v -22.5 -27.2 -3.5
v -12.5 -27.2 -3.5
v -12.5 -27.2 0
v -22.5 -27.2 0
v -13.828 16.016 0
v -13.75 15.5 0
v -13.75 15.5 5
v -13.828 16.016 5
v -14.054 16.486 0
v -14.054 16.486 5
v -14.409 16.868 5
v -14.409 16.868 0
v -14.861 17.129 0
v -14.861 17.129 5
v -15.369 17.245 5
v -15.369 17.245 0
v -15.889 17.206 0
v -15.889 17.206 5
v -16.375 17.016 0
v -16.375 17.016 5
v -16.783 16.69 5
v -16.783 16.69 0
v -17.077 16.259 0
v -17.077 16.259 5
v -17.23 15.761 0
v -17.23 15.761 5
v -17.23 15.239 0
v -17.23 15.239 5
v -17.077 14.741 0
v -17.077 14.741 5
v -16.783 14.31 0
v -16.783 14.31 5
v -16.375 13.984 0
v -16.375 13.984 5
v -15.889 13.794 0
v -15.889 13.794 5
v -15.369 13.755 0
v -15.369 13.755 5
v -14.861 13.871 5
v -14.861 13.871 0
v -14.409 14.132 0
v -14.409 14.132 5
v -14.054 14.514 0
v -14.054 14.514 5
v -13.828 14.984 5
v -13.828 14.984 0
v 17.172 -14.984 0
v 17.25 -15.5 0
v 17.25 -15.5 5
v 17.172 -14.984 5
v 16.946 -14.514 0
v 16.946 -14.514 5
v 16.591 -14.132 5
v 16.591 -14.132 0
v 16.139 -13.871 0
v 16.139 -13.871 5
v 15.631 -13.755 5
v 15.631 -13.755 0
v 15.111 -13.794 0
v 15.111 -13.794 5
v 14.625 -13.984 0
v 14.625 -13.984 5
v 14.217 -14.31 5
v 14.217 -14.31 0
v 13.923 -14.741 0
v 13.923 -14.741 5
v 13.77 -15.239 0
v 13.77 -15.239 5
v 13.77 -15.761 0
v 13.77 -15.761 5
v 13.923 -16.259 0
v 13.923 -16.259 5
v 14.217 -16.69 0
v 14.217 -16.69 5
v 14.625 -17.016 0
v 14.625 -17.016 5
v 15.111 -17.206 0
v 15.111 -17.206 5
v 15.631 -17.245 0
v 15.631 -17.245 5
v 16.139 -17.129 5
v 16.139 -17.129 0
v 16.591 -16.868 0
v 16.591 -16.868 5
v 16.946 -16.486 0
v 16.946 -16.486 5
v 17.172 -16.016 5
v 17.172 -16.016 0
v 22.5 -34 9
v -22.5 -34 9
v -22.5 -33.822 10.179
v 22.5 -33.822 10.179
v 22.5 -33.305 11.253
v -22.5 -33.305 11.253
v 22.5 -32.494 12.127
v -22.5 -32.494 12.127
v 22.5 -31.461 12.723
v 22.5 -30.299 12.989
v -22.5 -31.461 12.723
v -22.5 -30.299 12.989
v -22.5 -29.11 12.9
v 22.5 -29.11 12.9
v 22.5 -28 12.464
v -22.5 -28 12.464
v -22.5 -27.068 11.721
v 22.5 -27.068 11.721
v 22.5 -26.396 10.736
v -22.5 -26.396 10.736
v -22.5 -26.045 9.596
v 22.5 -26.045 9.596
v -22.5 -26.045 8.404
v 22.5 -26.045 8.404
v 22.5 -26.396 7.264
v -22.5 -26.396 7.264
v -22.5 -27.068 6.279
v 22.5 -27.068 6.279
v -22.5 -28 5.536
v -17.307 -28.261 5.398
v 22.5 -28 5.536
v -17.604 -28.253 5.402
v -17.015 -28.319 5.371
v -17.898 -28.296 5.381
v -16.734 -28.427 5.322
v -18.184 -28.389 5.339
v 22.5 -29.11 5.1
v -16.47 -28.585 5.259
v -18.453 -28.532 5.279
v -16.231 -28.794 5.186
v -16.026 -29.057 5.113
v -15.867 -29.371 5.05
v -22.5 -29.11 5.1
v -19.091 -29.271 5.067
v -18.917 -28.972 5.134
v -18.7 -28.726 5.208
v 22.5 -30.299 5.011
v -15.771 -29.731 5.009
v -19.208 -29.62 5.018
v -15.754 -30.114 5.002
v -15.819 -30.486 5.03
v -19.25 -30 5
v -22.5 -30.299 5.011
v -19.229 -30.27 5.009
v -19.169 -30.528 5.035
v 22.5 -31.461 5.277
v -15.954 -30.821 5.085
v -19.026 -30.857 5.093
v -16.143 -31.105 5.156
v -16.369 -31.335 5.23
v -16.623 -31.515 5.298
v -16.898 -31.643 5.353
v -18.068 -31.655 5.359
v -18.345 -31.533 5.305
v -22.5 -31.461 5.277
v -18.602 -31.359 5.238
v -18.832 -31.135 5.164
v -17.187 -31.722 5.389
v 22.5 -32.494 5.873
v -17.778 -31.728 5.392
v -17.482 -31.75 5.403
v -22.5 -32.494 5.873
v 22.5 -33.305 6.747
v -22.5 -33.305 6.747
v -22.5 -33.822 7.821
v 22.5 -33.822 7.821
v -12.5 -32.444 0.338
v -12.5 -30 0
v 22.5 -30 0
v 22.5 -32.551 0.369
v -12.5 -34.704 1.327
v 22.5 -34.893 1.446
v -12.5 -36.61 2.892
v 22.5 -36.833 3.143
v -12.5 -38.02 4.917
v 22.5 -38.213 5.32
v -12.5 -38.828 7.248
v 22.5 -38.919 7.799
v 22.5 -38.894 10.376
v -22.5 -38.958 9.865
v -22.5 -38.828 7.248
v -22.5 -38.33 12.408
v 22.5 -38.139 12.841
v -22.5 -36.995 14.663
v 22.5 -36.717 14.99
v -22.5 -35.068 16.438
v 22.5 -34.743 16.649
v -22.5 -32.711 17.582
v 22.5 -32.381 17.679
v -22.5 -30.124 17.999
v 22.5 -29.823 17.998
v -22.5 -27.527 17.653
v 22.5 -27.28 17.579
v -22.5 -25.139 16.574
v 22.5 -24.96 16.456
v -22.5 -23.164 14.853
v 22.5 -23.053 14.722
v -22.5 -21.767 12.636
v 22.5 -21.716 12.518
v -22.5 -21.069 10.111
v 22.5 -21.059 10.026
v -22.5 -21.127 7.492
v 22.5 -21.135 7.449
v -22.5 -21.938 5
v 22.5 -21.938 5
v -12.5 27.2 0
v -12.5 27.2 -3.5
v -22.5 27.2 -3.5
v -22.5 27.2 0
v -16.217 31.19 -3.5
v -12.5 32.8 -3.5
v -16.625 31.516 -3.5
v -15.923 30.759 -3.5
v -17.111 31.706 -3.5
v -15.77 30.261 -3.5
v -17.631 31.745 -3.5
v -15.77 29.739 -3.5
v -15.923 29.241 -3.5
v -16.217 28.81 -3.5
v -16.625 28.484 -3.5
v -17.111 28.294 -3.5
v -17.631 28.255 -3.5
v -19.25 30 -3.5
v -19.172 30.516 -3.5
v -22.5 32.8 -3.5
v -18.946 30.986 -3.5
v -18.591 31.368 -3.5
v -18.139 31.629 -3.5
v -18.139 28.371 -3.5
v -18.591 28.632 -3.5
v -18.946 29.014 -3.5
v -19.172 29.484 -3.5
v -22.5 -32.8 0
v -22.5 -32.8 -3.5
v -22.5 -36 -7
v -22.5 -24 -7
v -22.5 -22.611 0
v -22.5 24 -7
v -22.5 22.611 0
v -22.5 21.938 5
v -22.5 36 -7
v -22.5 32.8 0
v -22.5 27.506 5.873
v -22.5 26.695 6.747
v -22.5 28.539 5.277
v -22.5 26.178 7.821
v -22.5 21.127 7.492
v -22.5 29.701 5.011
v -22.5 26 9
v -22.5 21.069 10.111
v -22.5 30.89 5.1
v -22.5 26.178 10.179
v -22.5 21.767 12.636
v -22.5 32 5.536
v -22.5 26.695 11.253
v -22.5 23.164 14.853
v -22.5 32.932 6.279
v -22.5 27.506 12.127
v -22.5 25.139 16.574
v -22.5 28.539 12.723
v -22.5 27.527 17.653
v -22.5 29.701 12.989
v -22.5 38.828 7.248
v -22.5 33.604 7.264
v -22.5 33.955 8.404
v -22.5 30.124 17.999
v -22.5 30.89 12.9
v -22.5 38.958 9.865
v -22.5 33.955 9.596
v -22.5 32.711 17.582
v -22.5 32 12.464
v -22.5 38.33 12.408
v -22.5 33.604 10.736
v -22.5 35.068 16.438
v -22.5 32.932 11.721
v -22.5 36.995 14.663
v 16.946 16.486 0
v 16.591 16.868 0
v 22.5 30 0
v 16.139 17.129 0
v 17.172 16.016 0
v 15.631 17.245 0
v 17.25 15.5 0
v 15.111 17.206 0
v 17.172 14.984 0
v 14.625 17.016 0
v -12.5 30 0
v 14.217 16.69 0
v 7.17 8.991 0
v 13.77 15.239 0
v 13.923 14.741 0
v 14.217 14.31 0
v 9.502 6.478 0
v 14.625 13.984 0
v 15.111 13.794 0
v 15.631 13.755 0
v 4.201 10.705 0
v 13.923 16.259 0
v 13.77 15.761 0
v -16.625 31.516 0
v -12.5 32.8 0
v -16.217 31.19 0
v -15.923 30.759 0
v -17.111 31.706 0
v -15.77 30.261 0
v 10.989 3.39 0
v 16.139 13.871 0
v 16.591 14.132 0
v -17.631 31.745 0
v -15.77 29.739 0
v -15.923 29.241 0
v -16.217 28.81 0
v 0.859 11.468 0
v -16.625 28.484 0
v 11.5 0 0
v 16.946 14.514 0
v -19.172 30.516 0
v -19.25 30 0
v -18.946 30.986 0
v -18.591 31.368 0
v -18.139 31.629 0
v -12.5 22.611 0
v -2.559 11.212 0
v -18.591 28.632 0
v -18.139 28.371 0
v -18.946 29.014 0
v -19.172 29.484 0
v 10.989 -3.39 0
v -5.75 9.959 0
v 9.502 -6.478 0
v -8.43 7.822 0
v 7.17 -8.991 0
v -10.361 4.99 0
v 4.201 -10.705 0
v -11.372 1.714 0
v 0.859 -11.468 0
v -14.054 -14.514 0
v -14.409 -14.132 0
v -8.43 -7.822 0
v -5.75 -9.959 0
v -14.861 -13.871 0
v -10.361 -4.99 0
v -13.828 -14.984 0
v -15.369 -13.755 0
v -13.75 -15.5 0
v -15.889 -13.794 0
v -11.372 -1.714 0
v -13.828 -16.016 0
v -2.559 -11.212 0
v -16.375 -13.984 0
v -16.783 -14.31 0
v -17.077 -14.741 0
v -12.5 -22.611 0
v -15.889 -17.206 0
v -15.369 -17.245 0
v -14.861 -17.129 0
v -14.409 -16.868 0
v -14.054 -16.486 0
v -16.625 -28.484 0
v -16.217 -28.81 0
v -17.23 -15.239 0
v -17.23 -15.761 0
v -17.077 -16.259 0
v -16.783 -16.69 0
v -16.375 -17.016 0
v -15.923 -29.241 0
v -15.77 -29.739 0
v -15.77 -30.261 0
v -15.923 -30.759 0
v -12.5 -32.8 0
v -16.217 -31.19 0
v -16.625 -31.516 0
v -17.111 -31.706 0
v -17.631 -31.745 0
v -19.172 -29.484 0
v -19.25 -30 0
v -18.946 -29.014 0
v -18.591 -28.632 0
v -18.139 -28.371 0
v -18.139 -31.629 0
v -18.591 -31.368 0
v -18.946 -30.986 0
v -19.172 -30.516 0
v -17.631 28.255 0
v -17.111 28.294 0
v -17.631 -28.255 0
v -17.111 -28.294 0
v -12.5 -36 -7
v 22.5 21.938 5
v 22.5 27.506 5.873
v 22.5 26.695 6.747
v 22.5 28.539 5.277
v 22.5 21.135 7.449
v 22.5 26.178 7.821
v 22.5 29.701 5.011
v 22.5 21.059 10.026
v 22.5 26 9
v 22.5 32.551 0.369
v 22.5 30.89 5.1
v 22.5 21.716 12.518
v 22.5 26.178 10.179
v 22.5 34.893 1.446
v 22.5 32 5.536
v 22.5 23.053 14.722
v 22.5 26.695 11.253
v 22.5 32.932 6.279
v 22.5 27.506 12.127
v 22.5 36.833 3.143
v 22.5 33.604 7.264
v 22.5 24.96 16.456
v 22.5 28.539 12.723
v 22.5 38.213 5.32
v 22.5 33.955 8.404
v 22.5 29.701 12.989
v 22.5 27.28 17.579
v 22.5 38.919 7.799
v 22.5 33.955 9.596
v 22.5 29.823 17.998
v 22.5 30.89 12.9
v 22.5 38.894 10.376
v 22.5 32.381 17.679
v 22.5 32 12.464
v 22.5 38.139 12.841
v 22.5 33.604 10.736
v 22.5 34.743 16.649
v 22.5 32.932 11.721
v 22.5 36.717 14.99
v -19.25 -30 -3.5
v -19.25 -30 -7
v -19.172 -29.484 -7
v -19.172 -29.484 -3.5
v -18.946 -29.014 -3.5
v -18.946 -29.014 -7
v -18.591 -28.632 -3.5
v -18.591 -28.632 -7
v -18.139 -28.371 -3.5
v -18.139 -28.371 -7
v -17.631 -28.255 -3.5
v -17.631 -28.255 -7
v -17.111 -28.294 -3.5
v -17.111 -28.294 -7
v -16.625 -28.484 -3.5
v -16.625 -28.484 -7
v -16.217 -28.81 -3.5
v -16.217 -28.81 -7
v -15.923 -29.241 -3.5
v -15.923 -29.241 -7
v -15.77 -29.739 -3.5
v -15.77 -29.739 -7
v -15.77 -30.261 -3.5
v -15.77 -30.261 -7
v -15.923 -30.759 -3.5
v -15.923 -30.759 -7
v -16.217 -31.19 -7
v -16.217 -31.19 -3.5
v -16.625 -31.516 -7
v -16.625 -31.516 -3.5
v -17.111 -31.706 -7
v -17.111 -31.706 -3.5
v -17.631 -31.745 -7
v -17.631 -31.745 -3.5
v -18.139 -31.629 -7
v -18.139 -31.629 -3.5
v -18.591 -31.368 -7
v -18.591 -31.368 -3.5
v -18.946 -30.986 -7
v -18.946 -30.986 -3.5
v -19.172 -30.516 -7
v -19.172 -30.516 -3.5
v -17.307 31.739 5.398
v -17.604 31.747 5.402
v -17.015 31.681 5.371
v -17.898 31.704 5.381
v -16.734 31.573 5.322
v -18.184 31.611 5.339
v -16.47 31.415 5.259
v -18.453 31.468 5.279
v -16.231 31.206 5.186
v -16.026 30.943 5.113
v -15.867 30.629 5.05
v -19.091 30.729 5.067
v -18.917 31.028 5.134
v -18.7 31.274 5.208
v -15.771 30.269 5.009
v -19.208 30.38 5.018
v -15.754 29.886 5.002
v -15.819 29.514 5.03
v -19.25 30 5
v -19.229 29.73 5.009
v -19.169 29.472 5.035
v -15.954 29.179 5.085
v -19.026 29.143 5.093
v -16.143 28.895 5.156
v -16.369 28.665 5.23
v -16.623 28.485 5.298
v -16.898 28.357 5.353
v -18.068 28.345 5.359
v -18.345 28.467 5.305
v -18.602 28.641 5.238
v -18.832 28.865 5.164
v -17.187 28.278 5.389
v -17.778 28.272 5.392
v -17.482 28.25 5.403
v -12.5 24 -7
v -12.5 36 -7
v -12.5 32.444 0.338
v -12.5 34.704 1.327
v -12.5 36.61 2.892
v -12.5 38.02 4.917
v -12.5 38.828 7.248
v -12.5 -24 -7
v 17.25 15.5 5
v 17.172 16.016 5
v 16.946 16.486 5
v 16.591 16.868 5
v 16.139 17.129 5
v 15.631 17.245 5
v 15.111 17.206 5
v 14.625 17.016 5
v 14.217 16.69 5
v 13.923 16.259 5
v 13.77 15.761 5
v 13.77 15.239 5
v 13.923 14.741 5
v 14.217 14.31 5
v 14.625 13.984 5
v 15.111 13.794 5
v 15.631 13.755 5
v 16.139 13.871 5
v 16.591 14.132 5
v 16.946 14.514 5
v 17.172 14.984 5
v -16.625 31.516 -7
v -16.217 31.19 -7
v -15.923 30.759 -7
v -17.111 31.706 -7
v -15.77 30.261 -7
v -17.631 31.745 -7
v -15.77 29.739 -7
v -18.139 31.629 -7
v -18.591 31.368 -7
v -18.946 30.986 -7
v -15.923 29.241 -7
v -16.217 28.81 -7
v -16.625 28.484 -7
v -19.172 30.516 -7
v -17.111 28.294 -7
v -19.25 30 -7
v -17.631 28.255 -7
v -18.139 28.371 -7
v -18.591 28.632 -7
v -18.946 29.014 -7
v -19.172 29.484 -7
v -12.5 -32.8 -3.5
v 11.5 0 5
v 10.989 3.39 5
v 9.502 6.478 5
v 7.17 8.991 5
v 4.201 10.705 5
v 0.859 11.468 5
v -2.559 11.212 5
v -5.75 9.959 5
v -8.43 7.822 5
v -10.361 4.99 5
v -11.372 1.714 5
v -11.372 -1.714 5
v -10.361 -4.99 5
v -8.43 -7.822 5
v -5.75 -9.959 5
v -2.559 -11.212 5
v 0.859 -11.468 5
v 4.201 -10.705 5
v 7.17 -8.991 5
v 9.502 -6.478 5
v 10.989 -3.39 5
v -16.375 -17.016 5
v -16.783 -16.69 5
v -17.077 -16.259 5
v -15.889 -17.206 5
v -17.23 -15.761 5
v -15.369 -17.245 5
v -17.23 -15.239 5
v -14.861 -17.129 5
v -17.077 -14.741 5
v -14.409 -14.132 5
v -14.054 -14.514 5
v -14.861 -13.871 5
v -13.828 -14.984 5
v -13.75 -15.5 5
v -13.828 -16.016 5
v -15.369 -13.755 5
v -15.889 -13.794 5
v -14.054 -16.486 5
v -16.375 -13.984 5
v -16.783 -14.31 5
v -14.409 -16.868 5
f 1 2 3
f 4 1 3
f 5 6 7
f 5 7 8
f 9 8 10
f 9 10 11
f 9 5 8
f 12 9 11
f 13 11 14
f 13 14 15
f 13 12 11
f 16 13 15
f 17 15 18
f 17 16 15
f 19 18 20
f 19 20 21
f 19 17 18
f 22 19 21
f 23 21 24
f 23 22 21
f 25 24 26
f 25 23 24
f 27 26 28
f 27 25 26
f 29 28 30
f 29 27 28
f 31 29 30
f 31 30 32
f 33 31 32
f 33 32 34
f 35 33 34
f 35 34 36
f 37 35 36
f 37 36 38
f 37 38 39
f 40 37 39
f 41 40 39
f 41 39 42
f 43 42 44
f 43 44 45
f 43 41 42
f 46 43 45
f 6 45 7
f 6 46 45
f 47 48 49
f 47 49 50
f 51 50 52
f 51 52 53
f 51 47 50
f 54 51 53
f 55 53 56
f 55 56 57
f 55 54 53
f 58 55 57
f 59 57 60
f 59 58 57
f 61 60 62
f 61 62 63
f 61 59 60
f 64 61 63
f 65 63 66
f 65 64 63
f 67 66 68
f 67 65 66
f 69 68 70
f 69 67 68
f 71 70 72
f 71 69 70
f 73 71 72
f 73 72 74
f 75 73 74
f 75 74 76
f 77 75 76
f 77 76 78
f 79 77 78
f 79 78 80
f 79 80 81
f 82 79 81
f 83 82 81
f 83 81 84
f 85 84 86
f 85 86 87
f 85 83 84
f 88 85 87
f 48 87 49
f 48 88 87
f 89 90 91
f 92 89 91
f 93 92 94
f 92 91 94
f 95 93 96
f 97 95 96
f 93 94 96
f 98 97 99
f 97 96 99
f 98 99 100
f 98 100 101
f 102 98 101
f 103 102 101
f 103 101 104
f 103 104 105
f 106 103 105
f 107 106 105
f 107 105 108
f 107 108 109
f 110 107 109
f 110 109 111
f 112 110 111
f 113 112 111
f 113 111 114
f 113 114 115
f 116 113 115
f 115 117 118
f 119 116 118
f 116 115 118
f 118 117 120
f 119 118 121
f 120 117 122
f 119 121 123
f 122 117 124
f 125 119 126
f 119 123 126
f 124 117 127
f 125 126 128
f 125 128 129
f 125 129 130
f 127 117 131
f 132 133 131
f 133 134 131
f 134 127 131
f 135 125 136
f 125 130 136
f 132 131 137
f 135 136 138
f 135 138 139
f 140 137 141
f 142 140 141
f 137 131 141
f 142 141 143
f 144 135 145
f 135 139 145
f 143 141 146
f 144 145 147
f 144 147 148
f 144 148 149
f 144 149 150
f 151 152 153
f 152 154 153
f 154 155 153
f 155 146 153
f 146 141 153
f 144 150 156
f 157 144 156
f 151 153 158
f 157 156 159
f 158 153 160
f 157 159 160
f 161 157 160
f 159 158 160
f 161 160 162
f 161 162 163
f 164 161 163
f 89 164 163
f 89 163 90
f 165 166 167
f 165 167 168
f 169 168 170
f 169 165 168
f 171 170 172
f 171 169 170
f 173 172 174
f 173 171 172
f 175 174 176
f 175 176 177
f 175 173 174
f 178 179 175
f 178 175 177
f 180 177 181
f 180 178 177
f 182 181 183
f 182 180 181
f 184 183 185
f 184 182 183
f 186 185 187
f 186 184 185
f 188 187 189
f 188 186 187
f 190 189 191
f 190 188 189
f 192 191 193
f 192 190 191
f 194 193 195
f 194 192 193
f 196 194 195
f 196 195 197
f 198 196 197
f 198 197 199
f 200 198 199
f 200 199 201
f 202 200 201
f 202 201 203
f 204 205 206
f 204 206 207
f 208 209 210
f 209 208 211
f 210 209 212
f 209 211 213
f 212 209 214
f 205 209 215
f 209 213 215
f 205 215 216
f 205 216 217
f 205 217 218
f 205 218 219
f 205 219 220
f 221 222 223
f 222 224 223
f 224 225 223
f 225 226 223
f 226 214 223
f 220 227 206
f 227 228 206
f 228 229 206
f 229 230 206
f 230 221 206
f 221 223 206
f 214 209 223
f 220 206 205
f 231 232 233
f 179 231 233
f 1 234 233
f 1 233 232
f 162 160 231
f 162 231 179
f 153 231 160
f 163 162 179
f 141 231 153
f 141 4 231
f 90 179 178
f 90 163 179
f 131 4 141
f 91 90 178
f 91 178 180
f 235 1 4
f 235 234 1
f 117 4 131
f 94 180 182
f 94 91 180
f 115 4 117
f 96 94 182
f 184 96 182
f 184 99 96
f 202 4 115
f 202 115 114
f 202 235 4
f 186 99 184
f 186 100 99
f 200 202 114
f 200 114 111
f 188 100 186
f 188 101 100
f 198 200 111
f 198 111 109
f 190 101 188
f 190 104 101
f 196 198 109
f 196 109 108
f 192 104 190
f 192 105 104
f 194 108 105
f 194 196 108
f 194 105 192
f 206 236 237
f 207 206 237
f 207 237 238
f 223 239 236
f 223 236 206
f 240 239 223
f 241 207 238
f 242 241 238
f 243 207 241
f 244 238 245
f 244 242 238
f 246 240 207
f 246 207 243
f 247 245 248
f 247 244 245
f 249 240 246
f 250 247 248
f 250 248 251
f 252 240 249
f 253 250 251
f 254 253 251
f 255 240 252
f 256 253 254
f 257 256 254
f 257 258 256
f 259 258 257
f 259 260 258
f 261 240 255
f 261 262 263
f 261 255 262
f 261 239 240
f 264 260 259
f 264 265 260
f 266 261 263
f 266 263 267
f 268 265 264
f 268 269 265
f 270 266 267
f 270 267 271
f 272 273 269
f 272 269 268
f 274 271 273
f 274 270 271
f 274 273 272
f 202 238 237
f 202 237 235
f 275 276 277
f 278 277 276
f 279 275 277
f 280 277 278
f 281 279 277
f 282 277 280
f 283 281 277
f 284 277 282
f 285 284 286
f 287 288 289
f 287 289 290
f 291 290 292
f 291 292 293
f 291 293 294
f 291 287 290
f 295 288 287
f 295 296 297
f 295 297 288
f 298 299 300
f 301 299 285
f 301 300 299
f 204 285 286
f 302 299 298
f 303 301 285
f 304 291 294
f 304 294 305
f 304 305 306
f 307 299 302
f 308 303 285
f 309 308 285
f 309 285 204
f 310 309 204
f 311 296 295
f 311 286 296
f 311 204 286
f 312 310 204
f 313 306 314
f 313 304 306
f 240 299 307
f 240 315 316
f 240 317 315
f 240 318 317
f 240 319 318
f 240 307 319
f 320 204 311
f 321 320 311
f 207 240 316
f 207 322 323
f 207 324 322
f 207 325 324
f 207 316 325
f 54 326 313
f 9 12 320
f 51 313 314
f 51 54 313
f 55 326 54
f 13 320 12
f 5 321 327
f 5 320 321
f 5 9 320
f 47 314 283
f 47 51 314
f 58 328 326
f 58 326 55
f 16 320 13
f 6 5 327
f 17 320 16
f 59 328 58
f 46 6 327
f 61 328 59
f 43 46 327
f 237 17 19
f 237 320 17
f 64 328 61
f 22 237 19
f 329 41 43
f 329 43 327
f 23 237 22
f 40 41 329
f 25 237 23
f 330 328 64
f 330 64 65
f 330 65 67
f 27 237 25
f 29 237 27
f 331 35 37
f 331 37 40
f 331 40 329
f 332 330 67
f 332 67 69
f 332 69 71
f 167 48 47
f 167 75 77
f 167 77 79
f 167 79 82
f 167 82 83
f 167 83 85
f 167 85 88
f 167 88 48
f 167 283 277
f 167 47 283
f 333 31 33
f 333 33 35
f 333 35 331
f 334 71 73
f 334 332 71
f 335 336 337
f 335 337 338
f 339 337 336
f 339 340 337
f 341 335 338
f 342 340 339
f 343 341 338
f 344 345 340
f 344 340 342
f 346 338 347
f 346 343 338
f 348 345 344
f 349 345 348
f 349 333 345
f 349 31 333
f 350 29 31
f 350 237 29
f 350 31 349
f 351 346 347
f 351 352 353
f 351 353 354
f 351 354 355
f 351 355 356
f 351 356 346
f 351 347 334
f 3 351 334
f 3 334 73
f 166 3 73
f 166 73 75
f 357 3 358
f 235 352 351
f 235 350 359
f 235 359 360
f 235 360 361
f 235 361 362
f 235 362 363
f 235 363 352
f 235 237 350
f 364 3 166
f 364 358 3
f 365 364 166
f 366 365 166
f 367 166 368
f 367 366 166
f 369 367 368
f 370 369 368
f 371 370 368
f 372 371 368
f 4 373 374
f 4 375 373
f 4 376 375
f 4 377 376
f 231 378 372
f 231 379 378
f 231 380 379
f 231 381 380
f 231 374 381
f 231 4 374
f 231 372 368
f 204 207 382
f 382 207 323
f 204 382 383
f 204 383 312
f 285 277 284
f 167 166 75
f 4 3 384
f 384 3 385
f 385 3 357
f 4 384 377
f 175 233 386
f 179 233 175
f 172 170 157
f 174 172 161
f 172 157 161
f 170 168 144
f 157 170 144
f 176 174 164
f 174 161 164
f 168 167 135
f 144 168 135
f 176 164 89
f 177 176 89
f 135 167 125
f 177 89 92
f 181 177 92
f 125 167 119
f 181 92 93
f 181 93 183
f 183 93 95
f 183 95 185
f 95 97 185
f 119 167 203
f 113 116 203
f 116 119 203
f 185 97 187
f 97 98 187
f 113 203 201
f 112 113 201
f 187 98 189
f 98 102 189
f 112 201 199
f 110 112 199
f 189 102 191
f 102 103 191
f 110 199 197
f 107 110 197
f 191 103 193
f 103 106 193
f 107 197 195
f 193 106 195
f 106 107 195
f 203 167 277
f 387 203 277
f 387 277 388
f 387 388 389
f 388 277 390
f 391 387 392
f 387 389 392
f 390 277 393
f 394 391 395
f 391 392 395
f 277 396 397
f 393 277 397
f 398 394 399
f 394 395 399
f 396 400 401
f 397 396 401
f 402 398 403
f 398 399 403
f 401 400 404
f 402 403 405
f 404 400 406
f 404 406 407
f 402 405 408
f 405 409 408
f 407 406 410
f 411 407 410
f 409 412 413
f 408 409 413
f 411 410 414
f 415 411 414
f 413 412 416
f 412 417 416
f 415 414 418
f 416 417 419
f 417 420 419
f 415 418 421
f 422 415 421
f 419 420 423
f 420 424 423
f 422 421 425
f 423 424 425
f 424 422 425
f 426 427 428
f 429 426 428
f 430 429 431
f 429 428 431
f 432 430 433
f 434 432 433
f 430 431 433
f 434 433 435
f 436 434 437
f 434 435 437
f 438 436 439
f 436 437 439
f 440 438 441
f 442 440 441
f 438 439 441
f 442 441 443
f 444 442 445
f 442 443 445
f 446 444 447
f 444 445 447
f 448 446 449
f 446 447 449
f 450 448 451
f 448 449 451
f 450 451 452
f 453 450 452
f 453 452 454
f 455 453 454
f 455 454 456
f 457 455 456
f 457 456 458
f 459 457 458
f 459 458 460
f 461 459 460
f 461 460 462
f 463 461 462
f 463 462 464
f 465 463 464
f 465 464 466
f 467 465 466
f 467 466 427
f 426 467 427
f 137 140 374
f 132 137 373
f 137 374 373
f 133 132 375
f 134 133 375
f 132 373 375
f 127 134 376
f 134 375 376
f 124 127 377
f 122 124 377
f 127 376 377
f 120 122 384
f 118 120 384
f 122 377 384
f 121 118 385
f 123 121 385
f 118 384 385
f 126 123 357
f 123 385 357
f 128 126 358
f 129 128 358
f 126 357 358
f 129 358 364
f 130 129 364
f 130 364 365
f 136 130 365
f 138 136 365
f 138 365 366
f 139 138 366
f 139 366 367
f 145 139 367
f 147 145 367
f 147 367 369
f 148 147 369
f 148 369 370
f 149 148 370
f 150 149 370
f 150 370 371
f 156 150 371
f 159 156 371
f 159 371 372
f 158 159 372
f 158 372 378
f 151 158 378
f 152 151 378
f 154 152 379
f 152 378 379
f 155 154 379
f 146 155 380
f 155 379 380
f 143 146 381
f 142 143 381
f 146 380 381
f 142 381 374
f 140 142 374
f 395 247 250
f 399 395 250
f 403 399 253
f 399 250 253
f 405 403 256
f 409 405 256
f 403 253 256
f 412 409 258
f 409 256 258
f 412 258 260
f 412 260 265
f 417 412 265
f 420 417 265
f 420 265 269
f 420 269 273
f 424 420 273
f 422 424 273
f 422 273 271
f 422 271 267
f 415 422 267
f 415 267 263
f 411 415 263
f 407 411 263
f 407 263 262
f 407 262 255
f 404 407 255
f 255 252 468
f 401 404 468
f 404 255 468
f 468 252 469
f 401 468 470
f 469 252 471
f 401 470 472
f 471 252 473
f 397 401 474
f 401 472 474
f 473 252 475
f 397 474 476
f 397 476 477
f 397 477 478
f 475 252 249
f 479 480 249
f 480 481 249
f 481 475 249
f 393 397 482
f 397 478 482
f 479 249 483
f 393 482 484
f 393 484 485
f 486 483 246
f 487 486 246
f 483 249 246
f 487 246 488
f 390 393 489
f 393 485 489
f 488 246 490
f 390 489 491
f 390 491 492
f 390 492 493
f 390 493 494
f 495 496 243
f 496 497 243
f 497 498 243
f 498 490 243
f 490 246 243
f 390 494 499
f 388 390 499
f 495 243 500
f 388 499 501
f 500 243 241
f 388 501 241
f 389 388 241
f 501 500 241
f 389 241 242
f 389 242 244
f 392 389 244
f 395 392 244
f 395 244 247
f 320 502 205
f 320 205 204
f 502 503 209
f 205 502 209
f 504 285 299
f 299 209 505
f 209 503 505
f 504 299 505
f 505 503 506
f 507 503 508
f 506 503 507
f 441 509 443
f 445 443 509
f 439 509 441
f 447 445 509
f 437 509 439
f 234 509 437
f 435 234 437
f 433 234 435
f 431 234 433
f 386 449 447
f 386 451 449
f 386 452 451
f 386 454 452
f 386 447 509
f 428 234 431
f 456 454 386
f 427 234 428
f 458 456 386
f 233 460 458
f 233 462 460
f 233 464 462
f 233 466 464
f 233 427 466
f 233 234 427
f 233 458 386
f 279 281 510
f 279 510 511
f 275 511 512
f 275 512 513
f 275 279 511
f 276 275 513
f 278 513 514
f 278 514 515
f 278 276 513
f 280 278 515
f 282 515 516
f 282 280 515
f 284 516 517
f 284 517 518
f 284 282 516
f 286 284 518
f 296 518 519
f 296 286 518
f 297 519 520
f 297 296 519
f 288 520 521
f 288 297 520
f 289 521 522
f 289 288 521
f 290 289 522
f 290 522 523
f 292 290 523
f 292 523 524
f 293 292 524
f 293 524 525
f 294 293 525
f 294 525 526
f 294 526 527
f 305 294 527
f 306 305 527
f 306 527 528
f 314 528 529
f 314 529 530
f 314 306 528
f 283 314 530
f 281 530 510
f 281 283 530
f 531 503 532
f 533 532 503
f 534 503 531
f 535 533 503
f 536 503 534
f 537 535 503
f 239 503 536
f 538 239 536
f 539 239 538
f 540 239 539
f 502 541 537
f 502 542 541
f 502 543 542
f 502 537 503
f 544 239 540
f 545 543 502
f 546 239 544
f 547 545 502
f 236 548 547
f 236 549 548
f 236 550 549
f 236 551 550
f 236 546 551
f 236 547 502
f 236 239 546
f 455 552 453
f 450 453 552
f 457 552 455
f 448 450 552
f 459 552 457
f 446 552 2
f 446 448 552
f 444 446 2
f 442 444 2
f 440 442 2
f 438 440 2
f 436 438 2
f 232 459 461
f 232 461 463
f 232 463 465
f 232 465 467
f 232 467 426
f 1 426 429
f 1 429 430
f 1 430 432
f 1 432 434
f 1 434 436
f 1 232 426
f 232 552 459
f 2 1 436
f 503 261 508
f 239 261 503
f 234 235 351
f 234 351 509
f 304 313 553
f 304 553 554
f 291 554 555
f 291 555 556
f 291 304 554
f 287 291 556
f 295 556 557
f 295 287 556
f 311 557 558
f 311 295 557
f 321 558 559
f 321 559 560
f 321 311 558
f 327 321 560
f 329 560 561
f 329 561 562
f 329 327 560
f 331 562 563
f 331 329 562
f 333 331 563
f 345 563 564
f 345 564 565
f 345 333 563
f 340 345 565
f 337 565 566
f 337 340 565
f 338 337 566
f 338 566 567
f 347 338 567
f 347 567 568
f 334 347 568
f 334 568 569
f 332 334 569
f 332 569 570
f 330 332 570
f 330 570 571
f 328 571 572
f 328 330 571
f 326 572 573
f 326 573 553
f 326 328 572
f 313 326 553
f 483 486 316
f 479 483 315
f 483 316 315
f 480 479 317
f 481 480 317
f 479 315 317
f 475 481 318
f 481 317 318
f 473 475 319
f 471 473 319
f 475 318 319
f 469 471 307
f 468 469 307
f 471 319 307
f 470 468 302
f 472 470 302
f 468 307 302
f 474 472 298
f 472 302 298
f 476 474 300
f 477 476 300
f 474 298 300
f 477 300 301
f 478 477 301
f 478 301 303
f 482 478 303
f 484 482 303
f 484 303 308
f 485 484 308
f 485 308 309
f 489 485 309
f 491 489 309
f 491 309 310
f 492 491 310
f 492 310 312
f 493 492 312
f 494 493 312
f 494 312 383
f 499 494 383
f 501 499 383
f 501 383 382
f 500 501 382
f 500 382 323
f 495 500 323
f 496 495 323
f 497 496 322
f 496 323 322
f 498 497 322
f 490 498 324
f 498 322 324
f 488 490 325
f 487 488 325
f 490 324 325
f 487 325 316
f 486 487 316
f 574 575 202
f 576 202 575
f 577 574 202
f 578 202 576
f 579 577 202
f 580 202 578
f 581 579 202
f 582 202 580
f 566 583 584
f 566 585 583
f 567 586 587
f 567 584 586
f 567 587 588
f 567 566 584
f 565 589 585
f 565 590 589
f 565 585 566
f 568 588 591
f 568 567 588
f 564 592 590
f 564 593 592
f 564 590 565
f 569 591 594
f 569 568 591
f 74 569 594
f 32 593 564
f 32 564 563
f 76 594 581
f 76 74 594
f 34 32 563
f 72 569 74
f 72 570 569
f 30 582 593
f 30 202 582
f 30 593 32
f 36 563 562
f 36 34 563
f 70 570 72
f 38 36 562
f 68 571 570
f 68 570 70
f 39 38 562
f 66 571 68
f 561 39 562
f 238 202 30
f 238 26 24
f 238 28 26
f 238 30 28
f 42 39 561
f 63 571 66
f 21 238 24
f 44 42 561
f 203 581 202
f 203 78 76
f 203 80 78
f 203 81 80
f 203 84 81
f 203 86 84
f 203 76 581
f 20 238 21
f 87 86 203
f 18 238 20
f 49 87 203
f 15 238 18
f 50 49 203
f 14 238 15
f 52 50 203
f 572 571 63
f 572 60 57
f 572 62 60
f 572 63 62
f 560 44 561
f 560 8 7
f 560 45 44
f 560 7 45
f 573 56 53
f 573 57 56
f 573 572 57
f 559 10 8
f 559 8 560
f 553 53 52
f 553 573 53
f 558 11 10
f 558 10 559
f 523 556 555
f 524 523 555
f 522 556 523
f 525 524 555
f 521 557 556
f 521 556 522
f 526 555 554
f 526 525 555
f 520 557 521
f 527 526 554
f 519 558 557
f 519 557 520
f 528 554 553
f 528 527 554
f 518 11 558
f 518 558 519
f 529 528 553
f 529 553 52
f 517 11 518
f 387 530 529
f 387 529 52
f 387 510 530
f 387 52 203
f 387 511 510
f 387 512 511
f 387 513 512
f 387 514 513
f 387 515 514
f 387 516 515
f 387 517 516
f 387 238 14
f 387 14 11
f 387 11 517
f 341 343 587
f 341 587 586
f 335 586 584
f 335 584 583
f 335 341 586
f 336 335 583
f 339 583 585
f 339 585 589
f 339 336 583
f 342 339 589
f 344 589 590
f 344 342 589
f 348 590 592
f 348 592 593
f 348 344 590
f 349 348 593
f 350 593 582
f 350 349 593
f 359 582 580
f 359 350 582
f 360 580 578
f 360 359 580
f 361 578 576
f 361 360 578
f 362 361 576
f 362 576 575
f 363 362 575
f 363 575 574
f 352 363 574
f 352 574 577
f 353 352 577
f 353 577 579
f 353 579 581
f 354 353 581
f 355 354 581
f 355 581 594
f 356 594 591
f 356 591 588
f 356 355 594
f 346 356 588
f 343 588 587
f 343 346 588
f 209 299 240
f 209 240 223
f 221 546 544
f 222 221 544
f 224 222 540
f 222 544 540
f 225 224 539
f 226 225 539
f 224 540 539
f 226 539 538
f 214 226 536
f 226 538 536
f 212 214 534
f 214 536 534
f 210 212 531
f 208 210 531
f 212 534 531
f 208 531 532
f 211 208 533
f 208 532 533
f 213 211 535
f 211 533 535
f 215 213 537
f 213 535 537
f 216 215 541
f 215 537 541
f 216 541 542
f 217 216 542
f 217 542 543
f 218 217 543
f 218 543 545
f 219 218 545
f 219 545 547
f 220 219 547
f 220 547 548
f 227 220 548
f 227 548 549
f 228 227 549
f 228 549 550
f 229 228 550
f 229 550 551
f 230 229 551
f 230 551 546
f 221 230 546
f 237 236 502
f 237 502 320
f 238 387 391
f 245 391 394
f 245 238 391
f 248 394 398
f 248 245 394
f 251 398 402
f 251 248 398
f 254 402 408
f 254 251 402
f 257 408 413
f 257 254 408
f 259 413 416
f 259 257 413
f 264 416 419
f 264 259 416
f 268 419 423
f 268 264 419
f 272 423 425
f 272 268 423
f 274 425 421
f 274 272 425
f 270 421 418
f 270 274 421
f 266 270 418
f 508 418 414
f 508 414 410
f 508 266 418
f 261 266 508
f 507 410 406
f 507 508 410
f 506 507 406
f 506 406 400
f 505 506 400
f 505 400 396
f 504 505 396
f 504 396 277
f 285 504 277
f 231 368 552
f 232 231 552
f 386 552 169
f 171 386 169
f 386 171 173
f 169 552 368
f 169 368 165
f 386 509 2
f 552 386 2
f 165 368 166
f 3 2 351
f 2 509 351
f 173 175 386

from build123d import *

# Parameters (mm, degrees)
ESBO_O1_W                = 45
ESBO_O1_H                = 45
ESBO_O1_R                = 1.75
ESBO_O1_R_2              = 11.5
RESSALTO_EXTRUS_O1_DEPTH = 5
ESBO_O3_R                = 4
RESSALTO_EXTRUS_O2_DEPTH = 45
RESSALTO_EXTRUS_O3_DEPTH = 10
ESBO_O5_R                = 1.75
CORTE_EXTRUS_O2_DEPTH    = 15


with BuildPart() as part:
    # Esboço1 → Ressalto-extrusão1 (new body)
    with BuildSketch(Plane.XY):
        Rectangle(ESBO_O1_W, ESBO_O1_H)
        with Locations((-15.5, 15.5)):
            Circle(ESBO_O1_R, mode=Mode.SUBTRACT)
        with Locations((15.5, 15.5)):
            Circle(ESBO_O1_R, mode=Mode.SUBTRACT)
        with Locations((15.5, -15.5)):
            Circle(ESBO_O1_R, mode=Mode.SUBTRACT)
        with Locations((-15.5, -15.5)):
            Circle(ESBO_O1_R, mode=Mode.SUBTRACT)
        Circle(ESBO_O1_R_2, mode=Mode.SUBTRACT)
    extrude(amount=RESSALTO_EXTRUS_O1_DEPTH)

    # Esboço3 → Ressalto-extrusão2 (add)
    # profile 1 of 2: a face of its own
    with BuildSketch(Plane.ZY.offset(22.5)):
        with BuildLine():
            Line((0, 30), (0, 21.937742252))
            Line((0, 21.937742252), (5, 21.937742252))
            ThreePointArc((5, 21.937742252), (16.64852927, 34.74341649), (0, 30))
        make_face()
        with Locations(Location((9, 30, 0), (0, 0, 270))):
            Circle(ESBO_O3_R, mode=Mode.SUBTRACT)
    # profile 2 of 2: a face of its own
    with BuildSketch(Plane.ZY.offset(22.5)):
        with BuildLine():
            Line((5, -21.937742252), (0, -21.937742252))
            Line((0, -21.937742252), (0, -30))
            ThreePointArc((0, -30), (16.64852927, -34.74341649), (5, -21.937742252))
        make_face()
        with Locations(Location((9, -30, 0), (0, 0, 270))):
            Circle(ESBO_O3_R, mode=Mode.SUBTRACT)
    extrude(amount=-RESSALTO_EXTRUS_O2_DEPTH)

    # Esboço4 → Ressalto-extrusão3 (add)
    # profile 1 of 2: a face of its own
    with BuildSketch(Plane.ZY.offset(22.5)):
        Polygon((7.247929139, 38.827811037), (-7, 36), (-7, 24), (0, 22.610697943), align=None)
        Polygon((0, 30), (0, 32.8), (-3.5, 32.8), (-3.5, 27.2), (0, 27.2), align=None, mode=Mode.SUBTRACT)
    # profile 2 of 2: a face of its own
    with BuildSketch(Plane.ZY.offset(22.5)):
        Polygon((7.247929139, -38.827811037), (0, -22.610697943), (-7, -24), (-7, -36), align=None)
        Polygon((0, -27.2), (0, -30), (0, -32.8), (-3.5, -32.8), (-3.5, -27.2), align=None, mode=Mode.SUBTRACT)
    extrude(amount=-RESSALTO_EXTRUS_O3_DEPTH)

    # Esboço5 → Corte-extrusão2 (cut)
    with BuildSketch(Plane(origin=(0, 0, -7), x_dir=(-1, 0, 0), z_dir=(0, 0, -1))):
        with Locations((17.5, 30)):
            Circle(ESBO_O5_R)
        with Locations((17.5, -30)):
            Circle(ESBO_O5_R)
    extrude(amount=-CORTE_EXTRUS_O2_DEPTH, mode=Mode.SUBTRACT)


solid = part.part
